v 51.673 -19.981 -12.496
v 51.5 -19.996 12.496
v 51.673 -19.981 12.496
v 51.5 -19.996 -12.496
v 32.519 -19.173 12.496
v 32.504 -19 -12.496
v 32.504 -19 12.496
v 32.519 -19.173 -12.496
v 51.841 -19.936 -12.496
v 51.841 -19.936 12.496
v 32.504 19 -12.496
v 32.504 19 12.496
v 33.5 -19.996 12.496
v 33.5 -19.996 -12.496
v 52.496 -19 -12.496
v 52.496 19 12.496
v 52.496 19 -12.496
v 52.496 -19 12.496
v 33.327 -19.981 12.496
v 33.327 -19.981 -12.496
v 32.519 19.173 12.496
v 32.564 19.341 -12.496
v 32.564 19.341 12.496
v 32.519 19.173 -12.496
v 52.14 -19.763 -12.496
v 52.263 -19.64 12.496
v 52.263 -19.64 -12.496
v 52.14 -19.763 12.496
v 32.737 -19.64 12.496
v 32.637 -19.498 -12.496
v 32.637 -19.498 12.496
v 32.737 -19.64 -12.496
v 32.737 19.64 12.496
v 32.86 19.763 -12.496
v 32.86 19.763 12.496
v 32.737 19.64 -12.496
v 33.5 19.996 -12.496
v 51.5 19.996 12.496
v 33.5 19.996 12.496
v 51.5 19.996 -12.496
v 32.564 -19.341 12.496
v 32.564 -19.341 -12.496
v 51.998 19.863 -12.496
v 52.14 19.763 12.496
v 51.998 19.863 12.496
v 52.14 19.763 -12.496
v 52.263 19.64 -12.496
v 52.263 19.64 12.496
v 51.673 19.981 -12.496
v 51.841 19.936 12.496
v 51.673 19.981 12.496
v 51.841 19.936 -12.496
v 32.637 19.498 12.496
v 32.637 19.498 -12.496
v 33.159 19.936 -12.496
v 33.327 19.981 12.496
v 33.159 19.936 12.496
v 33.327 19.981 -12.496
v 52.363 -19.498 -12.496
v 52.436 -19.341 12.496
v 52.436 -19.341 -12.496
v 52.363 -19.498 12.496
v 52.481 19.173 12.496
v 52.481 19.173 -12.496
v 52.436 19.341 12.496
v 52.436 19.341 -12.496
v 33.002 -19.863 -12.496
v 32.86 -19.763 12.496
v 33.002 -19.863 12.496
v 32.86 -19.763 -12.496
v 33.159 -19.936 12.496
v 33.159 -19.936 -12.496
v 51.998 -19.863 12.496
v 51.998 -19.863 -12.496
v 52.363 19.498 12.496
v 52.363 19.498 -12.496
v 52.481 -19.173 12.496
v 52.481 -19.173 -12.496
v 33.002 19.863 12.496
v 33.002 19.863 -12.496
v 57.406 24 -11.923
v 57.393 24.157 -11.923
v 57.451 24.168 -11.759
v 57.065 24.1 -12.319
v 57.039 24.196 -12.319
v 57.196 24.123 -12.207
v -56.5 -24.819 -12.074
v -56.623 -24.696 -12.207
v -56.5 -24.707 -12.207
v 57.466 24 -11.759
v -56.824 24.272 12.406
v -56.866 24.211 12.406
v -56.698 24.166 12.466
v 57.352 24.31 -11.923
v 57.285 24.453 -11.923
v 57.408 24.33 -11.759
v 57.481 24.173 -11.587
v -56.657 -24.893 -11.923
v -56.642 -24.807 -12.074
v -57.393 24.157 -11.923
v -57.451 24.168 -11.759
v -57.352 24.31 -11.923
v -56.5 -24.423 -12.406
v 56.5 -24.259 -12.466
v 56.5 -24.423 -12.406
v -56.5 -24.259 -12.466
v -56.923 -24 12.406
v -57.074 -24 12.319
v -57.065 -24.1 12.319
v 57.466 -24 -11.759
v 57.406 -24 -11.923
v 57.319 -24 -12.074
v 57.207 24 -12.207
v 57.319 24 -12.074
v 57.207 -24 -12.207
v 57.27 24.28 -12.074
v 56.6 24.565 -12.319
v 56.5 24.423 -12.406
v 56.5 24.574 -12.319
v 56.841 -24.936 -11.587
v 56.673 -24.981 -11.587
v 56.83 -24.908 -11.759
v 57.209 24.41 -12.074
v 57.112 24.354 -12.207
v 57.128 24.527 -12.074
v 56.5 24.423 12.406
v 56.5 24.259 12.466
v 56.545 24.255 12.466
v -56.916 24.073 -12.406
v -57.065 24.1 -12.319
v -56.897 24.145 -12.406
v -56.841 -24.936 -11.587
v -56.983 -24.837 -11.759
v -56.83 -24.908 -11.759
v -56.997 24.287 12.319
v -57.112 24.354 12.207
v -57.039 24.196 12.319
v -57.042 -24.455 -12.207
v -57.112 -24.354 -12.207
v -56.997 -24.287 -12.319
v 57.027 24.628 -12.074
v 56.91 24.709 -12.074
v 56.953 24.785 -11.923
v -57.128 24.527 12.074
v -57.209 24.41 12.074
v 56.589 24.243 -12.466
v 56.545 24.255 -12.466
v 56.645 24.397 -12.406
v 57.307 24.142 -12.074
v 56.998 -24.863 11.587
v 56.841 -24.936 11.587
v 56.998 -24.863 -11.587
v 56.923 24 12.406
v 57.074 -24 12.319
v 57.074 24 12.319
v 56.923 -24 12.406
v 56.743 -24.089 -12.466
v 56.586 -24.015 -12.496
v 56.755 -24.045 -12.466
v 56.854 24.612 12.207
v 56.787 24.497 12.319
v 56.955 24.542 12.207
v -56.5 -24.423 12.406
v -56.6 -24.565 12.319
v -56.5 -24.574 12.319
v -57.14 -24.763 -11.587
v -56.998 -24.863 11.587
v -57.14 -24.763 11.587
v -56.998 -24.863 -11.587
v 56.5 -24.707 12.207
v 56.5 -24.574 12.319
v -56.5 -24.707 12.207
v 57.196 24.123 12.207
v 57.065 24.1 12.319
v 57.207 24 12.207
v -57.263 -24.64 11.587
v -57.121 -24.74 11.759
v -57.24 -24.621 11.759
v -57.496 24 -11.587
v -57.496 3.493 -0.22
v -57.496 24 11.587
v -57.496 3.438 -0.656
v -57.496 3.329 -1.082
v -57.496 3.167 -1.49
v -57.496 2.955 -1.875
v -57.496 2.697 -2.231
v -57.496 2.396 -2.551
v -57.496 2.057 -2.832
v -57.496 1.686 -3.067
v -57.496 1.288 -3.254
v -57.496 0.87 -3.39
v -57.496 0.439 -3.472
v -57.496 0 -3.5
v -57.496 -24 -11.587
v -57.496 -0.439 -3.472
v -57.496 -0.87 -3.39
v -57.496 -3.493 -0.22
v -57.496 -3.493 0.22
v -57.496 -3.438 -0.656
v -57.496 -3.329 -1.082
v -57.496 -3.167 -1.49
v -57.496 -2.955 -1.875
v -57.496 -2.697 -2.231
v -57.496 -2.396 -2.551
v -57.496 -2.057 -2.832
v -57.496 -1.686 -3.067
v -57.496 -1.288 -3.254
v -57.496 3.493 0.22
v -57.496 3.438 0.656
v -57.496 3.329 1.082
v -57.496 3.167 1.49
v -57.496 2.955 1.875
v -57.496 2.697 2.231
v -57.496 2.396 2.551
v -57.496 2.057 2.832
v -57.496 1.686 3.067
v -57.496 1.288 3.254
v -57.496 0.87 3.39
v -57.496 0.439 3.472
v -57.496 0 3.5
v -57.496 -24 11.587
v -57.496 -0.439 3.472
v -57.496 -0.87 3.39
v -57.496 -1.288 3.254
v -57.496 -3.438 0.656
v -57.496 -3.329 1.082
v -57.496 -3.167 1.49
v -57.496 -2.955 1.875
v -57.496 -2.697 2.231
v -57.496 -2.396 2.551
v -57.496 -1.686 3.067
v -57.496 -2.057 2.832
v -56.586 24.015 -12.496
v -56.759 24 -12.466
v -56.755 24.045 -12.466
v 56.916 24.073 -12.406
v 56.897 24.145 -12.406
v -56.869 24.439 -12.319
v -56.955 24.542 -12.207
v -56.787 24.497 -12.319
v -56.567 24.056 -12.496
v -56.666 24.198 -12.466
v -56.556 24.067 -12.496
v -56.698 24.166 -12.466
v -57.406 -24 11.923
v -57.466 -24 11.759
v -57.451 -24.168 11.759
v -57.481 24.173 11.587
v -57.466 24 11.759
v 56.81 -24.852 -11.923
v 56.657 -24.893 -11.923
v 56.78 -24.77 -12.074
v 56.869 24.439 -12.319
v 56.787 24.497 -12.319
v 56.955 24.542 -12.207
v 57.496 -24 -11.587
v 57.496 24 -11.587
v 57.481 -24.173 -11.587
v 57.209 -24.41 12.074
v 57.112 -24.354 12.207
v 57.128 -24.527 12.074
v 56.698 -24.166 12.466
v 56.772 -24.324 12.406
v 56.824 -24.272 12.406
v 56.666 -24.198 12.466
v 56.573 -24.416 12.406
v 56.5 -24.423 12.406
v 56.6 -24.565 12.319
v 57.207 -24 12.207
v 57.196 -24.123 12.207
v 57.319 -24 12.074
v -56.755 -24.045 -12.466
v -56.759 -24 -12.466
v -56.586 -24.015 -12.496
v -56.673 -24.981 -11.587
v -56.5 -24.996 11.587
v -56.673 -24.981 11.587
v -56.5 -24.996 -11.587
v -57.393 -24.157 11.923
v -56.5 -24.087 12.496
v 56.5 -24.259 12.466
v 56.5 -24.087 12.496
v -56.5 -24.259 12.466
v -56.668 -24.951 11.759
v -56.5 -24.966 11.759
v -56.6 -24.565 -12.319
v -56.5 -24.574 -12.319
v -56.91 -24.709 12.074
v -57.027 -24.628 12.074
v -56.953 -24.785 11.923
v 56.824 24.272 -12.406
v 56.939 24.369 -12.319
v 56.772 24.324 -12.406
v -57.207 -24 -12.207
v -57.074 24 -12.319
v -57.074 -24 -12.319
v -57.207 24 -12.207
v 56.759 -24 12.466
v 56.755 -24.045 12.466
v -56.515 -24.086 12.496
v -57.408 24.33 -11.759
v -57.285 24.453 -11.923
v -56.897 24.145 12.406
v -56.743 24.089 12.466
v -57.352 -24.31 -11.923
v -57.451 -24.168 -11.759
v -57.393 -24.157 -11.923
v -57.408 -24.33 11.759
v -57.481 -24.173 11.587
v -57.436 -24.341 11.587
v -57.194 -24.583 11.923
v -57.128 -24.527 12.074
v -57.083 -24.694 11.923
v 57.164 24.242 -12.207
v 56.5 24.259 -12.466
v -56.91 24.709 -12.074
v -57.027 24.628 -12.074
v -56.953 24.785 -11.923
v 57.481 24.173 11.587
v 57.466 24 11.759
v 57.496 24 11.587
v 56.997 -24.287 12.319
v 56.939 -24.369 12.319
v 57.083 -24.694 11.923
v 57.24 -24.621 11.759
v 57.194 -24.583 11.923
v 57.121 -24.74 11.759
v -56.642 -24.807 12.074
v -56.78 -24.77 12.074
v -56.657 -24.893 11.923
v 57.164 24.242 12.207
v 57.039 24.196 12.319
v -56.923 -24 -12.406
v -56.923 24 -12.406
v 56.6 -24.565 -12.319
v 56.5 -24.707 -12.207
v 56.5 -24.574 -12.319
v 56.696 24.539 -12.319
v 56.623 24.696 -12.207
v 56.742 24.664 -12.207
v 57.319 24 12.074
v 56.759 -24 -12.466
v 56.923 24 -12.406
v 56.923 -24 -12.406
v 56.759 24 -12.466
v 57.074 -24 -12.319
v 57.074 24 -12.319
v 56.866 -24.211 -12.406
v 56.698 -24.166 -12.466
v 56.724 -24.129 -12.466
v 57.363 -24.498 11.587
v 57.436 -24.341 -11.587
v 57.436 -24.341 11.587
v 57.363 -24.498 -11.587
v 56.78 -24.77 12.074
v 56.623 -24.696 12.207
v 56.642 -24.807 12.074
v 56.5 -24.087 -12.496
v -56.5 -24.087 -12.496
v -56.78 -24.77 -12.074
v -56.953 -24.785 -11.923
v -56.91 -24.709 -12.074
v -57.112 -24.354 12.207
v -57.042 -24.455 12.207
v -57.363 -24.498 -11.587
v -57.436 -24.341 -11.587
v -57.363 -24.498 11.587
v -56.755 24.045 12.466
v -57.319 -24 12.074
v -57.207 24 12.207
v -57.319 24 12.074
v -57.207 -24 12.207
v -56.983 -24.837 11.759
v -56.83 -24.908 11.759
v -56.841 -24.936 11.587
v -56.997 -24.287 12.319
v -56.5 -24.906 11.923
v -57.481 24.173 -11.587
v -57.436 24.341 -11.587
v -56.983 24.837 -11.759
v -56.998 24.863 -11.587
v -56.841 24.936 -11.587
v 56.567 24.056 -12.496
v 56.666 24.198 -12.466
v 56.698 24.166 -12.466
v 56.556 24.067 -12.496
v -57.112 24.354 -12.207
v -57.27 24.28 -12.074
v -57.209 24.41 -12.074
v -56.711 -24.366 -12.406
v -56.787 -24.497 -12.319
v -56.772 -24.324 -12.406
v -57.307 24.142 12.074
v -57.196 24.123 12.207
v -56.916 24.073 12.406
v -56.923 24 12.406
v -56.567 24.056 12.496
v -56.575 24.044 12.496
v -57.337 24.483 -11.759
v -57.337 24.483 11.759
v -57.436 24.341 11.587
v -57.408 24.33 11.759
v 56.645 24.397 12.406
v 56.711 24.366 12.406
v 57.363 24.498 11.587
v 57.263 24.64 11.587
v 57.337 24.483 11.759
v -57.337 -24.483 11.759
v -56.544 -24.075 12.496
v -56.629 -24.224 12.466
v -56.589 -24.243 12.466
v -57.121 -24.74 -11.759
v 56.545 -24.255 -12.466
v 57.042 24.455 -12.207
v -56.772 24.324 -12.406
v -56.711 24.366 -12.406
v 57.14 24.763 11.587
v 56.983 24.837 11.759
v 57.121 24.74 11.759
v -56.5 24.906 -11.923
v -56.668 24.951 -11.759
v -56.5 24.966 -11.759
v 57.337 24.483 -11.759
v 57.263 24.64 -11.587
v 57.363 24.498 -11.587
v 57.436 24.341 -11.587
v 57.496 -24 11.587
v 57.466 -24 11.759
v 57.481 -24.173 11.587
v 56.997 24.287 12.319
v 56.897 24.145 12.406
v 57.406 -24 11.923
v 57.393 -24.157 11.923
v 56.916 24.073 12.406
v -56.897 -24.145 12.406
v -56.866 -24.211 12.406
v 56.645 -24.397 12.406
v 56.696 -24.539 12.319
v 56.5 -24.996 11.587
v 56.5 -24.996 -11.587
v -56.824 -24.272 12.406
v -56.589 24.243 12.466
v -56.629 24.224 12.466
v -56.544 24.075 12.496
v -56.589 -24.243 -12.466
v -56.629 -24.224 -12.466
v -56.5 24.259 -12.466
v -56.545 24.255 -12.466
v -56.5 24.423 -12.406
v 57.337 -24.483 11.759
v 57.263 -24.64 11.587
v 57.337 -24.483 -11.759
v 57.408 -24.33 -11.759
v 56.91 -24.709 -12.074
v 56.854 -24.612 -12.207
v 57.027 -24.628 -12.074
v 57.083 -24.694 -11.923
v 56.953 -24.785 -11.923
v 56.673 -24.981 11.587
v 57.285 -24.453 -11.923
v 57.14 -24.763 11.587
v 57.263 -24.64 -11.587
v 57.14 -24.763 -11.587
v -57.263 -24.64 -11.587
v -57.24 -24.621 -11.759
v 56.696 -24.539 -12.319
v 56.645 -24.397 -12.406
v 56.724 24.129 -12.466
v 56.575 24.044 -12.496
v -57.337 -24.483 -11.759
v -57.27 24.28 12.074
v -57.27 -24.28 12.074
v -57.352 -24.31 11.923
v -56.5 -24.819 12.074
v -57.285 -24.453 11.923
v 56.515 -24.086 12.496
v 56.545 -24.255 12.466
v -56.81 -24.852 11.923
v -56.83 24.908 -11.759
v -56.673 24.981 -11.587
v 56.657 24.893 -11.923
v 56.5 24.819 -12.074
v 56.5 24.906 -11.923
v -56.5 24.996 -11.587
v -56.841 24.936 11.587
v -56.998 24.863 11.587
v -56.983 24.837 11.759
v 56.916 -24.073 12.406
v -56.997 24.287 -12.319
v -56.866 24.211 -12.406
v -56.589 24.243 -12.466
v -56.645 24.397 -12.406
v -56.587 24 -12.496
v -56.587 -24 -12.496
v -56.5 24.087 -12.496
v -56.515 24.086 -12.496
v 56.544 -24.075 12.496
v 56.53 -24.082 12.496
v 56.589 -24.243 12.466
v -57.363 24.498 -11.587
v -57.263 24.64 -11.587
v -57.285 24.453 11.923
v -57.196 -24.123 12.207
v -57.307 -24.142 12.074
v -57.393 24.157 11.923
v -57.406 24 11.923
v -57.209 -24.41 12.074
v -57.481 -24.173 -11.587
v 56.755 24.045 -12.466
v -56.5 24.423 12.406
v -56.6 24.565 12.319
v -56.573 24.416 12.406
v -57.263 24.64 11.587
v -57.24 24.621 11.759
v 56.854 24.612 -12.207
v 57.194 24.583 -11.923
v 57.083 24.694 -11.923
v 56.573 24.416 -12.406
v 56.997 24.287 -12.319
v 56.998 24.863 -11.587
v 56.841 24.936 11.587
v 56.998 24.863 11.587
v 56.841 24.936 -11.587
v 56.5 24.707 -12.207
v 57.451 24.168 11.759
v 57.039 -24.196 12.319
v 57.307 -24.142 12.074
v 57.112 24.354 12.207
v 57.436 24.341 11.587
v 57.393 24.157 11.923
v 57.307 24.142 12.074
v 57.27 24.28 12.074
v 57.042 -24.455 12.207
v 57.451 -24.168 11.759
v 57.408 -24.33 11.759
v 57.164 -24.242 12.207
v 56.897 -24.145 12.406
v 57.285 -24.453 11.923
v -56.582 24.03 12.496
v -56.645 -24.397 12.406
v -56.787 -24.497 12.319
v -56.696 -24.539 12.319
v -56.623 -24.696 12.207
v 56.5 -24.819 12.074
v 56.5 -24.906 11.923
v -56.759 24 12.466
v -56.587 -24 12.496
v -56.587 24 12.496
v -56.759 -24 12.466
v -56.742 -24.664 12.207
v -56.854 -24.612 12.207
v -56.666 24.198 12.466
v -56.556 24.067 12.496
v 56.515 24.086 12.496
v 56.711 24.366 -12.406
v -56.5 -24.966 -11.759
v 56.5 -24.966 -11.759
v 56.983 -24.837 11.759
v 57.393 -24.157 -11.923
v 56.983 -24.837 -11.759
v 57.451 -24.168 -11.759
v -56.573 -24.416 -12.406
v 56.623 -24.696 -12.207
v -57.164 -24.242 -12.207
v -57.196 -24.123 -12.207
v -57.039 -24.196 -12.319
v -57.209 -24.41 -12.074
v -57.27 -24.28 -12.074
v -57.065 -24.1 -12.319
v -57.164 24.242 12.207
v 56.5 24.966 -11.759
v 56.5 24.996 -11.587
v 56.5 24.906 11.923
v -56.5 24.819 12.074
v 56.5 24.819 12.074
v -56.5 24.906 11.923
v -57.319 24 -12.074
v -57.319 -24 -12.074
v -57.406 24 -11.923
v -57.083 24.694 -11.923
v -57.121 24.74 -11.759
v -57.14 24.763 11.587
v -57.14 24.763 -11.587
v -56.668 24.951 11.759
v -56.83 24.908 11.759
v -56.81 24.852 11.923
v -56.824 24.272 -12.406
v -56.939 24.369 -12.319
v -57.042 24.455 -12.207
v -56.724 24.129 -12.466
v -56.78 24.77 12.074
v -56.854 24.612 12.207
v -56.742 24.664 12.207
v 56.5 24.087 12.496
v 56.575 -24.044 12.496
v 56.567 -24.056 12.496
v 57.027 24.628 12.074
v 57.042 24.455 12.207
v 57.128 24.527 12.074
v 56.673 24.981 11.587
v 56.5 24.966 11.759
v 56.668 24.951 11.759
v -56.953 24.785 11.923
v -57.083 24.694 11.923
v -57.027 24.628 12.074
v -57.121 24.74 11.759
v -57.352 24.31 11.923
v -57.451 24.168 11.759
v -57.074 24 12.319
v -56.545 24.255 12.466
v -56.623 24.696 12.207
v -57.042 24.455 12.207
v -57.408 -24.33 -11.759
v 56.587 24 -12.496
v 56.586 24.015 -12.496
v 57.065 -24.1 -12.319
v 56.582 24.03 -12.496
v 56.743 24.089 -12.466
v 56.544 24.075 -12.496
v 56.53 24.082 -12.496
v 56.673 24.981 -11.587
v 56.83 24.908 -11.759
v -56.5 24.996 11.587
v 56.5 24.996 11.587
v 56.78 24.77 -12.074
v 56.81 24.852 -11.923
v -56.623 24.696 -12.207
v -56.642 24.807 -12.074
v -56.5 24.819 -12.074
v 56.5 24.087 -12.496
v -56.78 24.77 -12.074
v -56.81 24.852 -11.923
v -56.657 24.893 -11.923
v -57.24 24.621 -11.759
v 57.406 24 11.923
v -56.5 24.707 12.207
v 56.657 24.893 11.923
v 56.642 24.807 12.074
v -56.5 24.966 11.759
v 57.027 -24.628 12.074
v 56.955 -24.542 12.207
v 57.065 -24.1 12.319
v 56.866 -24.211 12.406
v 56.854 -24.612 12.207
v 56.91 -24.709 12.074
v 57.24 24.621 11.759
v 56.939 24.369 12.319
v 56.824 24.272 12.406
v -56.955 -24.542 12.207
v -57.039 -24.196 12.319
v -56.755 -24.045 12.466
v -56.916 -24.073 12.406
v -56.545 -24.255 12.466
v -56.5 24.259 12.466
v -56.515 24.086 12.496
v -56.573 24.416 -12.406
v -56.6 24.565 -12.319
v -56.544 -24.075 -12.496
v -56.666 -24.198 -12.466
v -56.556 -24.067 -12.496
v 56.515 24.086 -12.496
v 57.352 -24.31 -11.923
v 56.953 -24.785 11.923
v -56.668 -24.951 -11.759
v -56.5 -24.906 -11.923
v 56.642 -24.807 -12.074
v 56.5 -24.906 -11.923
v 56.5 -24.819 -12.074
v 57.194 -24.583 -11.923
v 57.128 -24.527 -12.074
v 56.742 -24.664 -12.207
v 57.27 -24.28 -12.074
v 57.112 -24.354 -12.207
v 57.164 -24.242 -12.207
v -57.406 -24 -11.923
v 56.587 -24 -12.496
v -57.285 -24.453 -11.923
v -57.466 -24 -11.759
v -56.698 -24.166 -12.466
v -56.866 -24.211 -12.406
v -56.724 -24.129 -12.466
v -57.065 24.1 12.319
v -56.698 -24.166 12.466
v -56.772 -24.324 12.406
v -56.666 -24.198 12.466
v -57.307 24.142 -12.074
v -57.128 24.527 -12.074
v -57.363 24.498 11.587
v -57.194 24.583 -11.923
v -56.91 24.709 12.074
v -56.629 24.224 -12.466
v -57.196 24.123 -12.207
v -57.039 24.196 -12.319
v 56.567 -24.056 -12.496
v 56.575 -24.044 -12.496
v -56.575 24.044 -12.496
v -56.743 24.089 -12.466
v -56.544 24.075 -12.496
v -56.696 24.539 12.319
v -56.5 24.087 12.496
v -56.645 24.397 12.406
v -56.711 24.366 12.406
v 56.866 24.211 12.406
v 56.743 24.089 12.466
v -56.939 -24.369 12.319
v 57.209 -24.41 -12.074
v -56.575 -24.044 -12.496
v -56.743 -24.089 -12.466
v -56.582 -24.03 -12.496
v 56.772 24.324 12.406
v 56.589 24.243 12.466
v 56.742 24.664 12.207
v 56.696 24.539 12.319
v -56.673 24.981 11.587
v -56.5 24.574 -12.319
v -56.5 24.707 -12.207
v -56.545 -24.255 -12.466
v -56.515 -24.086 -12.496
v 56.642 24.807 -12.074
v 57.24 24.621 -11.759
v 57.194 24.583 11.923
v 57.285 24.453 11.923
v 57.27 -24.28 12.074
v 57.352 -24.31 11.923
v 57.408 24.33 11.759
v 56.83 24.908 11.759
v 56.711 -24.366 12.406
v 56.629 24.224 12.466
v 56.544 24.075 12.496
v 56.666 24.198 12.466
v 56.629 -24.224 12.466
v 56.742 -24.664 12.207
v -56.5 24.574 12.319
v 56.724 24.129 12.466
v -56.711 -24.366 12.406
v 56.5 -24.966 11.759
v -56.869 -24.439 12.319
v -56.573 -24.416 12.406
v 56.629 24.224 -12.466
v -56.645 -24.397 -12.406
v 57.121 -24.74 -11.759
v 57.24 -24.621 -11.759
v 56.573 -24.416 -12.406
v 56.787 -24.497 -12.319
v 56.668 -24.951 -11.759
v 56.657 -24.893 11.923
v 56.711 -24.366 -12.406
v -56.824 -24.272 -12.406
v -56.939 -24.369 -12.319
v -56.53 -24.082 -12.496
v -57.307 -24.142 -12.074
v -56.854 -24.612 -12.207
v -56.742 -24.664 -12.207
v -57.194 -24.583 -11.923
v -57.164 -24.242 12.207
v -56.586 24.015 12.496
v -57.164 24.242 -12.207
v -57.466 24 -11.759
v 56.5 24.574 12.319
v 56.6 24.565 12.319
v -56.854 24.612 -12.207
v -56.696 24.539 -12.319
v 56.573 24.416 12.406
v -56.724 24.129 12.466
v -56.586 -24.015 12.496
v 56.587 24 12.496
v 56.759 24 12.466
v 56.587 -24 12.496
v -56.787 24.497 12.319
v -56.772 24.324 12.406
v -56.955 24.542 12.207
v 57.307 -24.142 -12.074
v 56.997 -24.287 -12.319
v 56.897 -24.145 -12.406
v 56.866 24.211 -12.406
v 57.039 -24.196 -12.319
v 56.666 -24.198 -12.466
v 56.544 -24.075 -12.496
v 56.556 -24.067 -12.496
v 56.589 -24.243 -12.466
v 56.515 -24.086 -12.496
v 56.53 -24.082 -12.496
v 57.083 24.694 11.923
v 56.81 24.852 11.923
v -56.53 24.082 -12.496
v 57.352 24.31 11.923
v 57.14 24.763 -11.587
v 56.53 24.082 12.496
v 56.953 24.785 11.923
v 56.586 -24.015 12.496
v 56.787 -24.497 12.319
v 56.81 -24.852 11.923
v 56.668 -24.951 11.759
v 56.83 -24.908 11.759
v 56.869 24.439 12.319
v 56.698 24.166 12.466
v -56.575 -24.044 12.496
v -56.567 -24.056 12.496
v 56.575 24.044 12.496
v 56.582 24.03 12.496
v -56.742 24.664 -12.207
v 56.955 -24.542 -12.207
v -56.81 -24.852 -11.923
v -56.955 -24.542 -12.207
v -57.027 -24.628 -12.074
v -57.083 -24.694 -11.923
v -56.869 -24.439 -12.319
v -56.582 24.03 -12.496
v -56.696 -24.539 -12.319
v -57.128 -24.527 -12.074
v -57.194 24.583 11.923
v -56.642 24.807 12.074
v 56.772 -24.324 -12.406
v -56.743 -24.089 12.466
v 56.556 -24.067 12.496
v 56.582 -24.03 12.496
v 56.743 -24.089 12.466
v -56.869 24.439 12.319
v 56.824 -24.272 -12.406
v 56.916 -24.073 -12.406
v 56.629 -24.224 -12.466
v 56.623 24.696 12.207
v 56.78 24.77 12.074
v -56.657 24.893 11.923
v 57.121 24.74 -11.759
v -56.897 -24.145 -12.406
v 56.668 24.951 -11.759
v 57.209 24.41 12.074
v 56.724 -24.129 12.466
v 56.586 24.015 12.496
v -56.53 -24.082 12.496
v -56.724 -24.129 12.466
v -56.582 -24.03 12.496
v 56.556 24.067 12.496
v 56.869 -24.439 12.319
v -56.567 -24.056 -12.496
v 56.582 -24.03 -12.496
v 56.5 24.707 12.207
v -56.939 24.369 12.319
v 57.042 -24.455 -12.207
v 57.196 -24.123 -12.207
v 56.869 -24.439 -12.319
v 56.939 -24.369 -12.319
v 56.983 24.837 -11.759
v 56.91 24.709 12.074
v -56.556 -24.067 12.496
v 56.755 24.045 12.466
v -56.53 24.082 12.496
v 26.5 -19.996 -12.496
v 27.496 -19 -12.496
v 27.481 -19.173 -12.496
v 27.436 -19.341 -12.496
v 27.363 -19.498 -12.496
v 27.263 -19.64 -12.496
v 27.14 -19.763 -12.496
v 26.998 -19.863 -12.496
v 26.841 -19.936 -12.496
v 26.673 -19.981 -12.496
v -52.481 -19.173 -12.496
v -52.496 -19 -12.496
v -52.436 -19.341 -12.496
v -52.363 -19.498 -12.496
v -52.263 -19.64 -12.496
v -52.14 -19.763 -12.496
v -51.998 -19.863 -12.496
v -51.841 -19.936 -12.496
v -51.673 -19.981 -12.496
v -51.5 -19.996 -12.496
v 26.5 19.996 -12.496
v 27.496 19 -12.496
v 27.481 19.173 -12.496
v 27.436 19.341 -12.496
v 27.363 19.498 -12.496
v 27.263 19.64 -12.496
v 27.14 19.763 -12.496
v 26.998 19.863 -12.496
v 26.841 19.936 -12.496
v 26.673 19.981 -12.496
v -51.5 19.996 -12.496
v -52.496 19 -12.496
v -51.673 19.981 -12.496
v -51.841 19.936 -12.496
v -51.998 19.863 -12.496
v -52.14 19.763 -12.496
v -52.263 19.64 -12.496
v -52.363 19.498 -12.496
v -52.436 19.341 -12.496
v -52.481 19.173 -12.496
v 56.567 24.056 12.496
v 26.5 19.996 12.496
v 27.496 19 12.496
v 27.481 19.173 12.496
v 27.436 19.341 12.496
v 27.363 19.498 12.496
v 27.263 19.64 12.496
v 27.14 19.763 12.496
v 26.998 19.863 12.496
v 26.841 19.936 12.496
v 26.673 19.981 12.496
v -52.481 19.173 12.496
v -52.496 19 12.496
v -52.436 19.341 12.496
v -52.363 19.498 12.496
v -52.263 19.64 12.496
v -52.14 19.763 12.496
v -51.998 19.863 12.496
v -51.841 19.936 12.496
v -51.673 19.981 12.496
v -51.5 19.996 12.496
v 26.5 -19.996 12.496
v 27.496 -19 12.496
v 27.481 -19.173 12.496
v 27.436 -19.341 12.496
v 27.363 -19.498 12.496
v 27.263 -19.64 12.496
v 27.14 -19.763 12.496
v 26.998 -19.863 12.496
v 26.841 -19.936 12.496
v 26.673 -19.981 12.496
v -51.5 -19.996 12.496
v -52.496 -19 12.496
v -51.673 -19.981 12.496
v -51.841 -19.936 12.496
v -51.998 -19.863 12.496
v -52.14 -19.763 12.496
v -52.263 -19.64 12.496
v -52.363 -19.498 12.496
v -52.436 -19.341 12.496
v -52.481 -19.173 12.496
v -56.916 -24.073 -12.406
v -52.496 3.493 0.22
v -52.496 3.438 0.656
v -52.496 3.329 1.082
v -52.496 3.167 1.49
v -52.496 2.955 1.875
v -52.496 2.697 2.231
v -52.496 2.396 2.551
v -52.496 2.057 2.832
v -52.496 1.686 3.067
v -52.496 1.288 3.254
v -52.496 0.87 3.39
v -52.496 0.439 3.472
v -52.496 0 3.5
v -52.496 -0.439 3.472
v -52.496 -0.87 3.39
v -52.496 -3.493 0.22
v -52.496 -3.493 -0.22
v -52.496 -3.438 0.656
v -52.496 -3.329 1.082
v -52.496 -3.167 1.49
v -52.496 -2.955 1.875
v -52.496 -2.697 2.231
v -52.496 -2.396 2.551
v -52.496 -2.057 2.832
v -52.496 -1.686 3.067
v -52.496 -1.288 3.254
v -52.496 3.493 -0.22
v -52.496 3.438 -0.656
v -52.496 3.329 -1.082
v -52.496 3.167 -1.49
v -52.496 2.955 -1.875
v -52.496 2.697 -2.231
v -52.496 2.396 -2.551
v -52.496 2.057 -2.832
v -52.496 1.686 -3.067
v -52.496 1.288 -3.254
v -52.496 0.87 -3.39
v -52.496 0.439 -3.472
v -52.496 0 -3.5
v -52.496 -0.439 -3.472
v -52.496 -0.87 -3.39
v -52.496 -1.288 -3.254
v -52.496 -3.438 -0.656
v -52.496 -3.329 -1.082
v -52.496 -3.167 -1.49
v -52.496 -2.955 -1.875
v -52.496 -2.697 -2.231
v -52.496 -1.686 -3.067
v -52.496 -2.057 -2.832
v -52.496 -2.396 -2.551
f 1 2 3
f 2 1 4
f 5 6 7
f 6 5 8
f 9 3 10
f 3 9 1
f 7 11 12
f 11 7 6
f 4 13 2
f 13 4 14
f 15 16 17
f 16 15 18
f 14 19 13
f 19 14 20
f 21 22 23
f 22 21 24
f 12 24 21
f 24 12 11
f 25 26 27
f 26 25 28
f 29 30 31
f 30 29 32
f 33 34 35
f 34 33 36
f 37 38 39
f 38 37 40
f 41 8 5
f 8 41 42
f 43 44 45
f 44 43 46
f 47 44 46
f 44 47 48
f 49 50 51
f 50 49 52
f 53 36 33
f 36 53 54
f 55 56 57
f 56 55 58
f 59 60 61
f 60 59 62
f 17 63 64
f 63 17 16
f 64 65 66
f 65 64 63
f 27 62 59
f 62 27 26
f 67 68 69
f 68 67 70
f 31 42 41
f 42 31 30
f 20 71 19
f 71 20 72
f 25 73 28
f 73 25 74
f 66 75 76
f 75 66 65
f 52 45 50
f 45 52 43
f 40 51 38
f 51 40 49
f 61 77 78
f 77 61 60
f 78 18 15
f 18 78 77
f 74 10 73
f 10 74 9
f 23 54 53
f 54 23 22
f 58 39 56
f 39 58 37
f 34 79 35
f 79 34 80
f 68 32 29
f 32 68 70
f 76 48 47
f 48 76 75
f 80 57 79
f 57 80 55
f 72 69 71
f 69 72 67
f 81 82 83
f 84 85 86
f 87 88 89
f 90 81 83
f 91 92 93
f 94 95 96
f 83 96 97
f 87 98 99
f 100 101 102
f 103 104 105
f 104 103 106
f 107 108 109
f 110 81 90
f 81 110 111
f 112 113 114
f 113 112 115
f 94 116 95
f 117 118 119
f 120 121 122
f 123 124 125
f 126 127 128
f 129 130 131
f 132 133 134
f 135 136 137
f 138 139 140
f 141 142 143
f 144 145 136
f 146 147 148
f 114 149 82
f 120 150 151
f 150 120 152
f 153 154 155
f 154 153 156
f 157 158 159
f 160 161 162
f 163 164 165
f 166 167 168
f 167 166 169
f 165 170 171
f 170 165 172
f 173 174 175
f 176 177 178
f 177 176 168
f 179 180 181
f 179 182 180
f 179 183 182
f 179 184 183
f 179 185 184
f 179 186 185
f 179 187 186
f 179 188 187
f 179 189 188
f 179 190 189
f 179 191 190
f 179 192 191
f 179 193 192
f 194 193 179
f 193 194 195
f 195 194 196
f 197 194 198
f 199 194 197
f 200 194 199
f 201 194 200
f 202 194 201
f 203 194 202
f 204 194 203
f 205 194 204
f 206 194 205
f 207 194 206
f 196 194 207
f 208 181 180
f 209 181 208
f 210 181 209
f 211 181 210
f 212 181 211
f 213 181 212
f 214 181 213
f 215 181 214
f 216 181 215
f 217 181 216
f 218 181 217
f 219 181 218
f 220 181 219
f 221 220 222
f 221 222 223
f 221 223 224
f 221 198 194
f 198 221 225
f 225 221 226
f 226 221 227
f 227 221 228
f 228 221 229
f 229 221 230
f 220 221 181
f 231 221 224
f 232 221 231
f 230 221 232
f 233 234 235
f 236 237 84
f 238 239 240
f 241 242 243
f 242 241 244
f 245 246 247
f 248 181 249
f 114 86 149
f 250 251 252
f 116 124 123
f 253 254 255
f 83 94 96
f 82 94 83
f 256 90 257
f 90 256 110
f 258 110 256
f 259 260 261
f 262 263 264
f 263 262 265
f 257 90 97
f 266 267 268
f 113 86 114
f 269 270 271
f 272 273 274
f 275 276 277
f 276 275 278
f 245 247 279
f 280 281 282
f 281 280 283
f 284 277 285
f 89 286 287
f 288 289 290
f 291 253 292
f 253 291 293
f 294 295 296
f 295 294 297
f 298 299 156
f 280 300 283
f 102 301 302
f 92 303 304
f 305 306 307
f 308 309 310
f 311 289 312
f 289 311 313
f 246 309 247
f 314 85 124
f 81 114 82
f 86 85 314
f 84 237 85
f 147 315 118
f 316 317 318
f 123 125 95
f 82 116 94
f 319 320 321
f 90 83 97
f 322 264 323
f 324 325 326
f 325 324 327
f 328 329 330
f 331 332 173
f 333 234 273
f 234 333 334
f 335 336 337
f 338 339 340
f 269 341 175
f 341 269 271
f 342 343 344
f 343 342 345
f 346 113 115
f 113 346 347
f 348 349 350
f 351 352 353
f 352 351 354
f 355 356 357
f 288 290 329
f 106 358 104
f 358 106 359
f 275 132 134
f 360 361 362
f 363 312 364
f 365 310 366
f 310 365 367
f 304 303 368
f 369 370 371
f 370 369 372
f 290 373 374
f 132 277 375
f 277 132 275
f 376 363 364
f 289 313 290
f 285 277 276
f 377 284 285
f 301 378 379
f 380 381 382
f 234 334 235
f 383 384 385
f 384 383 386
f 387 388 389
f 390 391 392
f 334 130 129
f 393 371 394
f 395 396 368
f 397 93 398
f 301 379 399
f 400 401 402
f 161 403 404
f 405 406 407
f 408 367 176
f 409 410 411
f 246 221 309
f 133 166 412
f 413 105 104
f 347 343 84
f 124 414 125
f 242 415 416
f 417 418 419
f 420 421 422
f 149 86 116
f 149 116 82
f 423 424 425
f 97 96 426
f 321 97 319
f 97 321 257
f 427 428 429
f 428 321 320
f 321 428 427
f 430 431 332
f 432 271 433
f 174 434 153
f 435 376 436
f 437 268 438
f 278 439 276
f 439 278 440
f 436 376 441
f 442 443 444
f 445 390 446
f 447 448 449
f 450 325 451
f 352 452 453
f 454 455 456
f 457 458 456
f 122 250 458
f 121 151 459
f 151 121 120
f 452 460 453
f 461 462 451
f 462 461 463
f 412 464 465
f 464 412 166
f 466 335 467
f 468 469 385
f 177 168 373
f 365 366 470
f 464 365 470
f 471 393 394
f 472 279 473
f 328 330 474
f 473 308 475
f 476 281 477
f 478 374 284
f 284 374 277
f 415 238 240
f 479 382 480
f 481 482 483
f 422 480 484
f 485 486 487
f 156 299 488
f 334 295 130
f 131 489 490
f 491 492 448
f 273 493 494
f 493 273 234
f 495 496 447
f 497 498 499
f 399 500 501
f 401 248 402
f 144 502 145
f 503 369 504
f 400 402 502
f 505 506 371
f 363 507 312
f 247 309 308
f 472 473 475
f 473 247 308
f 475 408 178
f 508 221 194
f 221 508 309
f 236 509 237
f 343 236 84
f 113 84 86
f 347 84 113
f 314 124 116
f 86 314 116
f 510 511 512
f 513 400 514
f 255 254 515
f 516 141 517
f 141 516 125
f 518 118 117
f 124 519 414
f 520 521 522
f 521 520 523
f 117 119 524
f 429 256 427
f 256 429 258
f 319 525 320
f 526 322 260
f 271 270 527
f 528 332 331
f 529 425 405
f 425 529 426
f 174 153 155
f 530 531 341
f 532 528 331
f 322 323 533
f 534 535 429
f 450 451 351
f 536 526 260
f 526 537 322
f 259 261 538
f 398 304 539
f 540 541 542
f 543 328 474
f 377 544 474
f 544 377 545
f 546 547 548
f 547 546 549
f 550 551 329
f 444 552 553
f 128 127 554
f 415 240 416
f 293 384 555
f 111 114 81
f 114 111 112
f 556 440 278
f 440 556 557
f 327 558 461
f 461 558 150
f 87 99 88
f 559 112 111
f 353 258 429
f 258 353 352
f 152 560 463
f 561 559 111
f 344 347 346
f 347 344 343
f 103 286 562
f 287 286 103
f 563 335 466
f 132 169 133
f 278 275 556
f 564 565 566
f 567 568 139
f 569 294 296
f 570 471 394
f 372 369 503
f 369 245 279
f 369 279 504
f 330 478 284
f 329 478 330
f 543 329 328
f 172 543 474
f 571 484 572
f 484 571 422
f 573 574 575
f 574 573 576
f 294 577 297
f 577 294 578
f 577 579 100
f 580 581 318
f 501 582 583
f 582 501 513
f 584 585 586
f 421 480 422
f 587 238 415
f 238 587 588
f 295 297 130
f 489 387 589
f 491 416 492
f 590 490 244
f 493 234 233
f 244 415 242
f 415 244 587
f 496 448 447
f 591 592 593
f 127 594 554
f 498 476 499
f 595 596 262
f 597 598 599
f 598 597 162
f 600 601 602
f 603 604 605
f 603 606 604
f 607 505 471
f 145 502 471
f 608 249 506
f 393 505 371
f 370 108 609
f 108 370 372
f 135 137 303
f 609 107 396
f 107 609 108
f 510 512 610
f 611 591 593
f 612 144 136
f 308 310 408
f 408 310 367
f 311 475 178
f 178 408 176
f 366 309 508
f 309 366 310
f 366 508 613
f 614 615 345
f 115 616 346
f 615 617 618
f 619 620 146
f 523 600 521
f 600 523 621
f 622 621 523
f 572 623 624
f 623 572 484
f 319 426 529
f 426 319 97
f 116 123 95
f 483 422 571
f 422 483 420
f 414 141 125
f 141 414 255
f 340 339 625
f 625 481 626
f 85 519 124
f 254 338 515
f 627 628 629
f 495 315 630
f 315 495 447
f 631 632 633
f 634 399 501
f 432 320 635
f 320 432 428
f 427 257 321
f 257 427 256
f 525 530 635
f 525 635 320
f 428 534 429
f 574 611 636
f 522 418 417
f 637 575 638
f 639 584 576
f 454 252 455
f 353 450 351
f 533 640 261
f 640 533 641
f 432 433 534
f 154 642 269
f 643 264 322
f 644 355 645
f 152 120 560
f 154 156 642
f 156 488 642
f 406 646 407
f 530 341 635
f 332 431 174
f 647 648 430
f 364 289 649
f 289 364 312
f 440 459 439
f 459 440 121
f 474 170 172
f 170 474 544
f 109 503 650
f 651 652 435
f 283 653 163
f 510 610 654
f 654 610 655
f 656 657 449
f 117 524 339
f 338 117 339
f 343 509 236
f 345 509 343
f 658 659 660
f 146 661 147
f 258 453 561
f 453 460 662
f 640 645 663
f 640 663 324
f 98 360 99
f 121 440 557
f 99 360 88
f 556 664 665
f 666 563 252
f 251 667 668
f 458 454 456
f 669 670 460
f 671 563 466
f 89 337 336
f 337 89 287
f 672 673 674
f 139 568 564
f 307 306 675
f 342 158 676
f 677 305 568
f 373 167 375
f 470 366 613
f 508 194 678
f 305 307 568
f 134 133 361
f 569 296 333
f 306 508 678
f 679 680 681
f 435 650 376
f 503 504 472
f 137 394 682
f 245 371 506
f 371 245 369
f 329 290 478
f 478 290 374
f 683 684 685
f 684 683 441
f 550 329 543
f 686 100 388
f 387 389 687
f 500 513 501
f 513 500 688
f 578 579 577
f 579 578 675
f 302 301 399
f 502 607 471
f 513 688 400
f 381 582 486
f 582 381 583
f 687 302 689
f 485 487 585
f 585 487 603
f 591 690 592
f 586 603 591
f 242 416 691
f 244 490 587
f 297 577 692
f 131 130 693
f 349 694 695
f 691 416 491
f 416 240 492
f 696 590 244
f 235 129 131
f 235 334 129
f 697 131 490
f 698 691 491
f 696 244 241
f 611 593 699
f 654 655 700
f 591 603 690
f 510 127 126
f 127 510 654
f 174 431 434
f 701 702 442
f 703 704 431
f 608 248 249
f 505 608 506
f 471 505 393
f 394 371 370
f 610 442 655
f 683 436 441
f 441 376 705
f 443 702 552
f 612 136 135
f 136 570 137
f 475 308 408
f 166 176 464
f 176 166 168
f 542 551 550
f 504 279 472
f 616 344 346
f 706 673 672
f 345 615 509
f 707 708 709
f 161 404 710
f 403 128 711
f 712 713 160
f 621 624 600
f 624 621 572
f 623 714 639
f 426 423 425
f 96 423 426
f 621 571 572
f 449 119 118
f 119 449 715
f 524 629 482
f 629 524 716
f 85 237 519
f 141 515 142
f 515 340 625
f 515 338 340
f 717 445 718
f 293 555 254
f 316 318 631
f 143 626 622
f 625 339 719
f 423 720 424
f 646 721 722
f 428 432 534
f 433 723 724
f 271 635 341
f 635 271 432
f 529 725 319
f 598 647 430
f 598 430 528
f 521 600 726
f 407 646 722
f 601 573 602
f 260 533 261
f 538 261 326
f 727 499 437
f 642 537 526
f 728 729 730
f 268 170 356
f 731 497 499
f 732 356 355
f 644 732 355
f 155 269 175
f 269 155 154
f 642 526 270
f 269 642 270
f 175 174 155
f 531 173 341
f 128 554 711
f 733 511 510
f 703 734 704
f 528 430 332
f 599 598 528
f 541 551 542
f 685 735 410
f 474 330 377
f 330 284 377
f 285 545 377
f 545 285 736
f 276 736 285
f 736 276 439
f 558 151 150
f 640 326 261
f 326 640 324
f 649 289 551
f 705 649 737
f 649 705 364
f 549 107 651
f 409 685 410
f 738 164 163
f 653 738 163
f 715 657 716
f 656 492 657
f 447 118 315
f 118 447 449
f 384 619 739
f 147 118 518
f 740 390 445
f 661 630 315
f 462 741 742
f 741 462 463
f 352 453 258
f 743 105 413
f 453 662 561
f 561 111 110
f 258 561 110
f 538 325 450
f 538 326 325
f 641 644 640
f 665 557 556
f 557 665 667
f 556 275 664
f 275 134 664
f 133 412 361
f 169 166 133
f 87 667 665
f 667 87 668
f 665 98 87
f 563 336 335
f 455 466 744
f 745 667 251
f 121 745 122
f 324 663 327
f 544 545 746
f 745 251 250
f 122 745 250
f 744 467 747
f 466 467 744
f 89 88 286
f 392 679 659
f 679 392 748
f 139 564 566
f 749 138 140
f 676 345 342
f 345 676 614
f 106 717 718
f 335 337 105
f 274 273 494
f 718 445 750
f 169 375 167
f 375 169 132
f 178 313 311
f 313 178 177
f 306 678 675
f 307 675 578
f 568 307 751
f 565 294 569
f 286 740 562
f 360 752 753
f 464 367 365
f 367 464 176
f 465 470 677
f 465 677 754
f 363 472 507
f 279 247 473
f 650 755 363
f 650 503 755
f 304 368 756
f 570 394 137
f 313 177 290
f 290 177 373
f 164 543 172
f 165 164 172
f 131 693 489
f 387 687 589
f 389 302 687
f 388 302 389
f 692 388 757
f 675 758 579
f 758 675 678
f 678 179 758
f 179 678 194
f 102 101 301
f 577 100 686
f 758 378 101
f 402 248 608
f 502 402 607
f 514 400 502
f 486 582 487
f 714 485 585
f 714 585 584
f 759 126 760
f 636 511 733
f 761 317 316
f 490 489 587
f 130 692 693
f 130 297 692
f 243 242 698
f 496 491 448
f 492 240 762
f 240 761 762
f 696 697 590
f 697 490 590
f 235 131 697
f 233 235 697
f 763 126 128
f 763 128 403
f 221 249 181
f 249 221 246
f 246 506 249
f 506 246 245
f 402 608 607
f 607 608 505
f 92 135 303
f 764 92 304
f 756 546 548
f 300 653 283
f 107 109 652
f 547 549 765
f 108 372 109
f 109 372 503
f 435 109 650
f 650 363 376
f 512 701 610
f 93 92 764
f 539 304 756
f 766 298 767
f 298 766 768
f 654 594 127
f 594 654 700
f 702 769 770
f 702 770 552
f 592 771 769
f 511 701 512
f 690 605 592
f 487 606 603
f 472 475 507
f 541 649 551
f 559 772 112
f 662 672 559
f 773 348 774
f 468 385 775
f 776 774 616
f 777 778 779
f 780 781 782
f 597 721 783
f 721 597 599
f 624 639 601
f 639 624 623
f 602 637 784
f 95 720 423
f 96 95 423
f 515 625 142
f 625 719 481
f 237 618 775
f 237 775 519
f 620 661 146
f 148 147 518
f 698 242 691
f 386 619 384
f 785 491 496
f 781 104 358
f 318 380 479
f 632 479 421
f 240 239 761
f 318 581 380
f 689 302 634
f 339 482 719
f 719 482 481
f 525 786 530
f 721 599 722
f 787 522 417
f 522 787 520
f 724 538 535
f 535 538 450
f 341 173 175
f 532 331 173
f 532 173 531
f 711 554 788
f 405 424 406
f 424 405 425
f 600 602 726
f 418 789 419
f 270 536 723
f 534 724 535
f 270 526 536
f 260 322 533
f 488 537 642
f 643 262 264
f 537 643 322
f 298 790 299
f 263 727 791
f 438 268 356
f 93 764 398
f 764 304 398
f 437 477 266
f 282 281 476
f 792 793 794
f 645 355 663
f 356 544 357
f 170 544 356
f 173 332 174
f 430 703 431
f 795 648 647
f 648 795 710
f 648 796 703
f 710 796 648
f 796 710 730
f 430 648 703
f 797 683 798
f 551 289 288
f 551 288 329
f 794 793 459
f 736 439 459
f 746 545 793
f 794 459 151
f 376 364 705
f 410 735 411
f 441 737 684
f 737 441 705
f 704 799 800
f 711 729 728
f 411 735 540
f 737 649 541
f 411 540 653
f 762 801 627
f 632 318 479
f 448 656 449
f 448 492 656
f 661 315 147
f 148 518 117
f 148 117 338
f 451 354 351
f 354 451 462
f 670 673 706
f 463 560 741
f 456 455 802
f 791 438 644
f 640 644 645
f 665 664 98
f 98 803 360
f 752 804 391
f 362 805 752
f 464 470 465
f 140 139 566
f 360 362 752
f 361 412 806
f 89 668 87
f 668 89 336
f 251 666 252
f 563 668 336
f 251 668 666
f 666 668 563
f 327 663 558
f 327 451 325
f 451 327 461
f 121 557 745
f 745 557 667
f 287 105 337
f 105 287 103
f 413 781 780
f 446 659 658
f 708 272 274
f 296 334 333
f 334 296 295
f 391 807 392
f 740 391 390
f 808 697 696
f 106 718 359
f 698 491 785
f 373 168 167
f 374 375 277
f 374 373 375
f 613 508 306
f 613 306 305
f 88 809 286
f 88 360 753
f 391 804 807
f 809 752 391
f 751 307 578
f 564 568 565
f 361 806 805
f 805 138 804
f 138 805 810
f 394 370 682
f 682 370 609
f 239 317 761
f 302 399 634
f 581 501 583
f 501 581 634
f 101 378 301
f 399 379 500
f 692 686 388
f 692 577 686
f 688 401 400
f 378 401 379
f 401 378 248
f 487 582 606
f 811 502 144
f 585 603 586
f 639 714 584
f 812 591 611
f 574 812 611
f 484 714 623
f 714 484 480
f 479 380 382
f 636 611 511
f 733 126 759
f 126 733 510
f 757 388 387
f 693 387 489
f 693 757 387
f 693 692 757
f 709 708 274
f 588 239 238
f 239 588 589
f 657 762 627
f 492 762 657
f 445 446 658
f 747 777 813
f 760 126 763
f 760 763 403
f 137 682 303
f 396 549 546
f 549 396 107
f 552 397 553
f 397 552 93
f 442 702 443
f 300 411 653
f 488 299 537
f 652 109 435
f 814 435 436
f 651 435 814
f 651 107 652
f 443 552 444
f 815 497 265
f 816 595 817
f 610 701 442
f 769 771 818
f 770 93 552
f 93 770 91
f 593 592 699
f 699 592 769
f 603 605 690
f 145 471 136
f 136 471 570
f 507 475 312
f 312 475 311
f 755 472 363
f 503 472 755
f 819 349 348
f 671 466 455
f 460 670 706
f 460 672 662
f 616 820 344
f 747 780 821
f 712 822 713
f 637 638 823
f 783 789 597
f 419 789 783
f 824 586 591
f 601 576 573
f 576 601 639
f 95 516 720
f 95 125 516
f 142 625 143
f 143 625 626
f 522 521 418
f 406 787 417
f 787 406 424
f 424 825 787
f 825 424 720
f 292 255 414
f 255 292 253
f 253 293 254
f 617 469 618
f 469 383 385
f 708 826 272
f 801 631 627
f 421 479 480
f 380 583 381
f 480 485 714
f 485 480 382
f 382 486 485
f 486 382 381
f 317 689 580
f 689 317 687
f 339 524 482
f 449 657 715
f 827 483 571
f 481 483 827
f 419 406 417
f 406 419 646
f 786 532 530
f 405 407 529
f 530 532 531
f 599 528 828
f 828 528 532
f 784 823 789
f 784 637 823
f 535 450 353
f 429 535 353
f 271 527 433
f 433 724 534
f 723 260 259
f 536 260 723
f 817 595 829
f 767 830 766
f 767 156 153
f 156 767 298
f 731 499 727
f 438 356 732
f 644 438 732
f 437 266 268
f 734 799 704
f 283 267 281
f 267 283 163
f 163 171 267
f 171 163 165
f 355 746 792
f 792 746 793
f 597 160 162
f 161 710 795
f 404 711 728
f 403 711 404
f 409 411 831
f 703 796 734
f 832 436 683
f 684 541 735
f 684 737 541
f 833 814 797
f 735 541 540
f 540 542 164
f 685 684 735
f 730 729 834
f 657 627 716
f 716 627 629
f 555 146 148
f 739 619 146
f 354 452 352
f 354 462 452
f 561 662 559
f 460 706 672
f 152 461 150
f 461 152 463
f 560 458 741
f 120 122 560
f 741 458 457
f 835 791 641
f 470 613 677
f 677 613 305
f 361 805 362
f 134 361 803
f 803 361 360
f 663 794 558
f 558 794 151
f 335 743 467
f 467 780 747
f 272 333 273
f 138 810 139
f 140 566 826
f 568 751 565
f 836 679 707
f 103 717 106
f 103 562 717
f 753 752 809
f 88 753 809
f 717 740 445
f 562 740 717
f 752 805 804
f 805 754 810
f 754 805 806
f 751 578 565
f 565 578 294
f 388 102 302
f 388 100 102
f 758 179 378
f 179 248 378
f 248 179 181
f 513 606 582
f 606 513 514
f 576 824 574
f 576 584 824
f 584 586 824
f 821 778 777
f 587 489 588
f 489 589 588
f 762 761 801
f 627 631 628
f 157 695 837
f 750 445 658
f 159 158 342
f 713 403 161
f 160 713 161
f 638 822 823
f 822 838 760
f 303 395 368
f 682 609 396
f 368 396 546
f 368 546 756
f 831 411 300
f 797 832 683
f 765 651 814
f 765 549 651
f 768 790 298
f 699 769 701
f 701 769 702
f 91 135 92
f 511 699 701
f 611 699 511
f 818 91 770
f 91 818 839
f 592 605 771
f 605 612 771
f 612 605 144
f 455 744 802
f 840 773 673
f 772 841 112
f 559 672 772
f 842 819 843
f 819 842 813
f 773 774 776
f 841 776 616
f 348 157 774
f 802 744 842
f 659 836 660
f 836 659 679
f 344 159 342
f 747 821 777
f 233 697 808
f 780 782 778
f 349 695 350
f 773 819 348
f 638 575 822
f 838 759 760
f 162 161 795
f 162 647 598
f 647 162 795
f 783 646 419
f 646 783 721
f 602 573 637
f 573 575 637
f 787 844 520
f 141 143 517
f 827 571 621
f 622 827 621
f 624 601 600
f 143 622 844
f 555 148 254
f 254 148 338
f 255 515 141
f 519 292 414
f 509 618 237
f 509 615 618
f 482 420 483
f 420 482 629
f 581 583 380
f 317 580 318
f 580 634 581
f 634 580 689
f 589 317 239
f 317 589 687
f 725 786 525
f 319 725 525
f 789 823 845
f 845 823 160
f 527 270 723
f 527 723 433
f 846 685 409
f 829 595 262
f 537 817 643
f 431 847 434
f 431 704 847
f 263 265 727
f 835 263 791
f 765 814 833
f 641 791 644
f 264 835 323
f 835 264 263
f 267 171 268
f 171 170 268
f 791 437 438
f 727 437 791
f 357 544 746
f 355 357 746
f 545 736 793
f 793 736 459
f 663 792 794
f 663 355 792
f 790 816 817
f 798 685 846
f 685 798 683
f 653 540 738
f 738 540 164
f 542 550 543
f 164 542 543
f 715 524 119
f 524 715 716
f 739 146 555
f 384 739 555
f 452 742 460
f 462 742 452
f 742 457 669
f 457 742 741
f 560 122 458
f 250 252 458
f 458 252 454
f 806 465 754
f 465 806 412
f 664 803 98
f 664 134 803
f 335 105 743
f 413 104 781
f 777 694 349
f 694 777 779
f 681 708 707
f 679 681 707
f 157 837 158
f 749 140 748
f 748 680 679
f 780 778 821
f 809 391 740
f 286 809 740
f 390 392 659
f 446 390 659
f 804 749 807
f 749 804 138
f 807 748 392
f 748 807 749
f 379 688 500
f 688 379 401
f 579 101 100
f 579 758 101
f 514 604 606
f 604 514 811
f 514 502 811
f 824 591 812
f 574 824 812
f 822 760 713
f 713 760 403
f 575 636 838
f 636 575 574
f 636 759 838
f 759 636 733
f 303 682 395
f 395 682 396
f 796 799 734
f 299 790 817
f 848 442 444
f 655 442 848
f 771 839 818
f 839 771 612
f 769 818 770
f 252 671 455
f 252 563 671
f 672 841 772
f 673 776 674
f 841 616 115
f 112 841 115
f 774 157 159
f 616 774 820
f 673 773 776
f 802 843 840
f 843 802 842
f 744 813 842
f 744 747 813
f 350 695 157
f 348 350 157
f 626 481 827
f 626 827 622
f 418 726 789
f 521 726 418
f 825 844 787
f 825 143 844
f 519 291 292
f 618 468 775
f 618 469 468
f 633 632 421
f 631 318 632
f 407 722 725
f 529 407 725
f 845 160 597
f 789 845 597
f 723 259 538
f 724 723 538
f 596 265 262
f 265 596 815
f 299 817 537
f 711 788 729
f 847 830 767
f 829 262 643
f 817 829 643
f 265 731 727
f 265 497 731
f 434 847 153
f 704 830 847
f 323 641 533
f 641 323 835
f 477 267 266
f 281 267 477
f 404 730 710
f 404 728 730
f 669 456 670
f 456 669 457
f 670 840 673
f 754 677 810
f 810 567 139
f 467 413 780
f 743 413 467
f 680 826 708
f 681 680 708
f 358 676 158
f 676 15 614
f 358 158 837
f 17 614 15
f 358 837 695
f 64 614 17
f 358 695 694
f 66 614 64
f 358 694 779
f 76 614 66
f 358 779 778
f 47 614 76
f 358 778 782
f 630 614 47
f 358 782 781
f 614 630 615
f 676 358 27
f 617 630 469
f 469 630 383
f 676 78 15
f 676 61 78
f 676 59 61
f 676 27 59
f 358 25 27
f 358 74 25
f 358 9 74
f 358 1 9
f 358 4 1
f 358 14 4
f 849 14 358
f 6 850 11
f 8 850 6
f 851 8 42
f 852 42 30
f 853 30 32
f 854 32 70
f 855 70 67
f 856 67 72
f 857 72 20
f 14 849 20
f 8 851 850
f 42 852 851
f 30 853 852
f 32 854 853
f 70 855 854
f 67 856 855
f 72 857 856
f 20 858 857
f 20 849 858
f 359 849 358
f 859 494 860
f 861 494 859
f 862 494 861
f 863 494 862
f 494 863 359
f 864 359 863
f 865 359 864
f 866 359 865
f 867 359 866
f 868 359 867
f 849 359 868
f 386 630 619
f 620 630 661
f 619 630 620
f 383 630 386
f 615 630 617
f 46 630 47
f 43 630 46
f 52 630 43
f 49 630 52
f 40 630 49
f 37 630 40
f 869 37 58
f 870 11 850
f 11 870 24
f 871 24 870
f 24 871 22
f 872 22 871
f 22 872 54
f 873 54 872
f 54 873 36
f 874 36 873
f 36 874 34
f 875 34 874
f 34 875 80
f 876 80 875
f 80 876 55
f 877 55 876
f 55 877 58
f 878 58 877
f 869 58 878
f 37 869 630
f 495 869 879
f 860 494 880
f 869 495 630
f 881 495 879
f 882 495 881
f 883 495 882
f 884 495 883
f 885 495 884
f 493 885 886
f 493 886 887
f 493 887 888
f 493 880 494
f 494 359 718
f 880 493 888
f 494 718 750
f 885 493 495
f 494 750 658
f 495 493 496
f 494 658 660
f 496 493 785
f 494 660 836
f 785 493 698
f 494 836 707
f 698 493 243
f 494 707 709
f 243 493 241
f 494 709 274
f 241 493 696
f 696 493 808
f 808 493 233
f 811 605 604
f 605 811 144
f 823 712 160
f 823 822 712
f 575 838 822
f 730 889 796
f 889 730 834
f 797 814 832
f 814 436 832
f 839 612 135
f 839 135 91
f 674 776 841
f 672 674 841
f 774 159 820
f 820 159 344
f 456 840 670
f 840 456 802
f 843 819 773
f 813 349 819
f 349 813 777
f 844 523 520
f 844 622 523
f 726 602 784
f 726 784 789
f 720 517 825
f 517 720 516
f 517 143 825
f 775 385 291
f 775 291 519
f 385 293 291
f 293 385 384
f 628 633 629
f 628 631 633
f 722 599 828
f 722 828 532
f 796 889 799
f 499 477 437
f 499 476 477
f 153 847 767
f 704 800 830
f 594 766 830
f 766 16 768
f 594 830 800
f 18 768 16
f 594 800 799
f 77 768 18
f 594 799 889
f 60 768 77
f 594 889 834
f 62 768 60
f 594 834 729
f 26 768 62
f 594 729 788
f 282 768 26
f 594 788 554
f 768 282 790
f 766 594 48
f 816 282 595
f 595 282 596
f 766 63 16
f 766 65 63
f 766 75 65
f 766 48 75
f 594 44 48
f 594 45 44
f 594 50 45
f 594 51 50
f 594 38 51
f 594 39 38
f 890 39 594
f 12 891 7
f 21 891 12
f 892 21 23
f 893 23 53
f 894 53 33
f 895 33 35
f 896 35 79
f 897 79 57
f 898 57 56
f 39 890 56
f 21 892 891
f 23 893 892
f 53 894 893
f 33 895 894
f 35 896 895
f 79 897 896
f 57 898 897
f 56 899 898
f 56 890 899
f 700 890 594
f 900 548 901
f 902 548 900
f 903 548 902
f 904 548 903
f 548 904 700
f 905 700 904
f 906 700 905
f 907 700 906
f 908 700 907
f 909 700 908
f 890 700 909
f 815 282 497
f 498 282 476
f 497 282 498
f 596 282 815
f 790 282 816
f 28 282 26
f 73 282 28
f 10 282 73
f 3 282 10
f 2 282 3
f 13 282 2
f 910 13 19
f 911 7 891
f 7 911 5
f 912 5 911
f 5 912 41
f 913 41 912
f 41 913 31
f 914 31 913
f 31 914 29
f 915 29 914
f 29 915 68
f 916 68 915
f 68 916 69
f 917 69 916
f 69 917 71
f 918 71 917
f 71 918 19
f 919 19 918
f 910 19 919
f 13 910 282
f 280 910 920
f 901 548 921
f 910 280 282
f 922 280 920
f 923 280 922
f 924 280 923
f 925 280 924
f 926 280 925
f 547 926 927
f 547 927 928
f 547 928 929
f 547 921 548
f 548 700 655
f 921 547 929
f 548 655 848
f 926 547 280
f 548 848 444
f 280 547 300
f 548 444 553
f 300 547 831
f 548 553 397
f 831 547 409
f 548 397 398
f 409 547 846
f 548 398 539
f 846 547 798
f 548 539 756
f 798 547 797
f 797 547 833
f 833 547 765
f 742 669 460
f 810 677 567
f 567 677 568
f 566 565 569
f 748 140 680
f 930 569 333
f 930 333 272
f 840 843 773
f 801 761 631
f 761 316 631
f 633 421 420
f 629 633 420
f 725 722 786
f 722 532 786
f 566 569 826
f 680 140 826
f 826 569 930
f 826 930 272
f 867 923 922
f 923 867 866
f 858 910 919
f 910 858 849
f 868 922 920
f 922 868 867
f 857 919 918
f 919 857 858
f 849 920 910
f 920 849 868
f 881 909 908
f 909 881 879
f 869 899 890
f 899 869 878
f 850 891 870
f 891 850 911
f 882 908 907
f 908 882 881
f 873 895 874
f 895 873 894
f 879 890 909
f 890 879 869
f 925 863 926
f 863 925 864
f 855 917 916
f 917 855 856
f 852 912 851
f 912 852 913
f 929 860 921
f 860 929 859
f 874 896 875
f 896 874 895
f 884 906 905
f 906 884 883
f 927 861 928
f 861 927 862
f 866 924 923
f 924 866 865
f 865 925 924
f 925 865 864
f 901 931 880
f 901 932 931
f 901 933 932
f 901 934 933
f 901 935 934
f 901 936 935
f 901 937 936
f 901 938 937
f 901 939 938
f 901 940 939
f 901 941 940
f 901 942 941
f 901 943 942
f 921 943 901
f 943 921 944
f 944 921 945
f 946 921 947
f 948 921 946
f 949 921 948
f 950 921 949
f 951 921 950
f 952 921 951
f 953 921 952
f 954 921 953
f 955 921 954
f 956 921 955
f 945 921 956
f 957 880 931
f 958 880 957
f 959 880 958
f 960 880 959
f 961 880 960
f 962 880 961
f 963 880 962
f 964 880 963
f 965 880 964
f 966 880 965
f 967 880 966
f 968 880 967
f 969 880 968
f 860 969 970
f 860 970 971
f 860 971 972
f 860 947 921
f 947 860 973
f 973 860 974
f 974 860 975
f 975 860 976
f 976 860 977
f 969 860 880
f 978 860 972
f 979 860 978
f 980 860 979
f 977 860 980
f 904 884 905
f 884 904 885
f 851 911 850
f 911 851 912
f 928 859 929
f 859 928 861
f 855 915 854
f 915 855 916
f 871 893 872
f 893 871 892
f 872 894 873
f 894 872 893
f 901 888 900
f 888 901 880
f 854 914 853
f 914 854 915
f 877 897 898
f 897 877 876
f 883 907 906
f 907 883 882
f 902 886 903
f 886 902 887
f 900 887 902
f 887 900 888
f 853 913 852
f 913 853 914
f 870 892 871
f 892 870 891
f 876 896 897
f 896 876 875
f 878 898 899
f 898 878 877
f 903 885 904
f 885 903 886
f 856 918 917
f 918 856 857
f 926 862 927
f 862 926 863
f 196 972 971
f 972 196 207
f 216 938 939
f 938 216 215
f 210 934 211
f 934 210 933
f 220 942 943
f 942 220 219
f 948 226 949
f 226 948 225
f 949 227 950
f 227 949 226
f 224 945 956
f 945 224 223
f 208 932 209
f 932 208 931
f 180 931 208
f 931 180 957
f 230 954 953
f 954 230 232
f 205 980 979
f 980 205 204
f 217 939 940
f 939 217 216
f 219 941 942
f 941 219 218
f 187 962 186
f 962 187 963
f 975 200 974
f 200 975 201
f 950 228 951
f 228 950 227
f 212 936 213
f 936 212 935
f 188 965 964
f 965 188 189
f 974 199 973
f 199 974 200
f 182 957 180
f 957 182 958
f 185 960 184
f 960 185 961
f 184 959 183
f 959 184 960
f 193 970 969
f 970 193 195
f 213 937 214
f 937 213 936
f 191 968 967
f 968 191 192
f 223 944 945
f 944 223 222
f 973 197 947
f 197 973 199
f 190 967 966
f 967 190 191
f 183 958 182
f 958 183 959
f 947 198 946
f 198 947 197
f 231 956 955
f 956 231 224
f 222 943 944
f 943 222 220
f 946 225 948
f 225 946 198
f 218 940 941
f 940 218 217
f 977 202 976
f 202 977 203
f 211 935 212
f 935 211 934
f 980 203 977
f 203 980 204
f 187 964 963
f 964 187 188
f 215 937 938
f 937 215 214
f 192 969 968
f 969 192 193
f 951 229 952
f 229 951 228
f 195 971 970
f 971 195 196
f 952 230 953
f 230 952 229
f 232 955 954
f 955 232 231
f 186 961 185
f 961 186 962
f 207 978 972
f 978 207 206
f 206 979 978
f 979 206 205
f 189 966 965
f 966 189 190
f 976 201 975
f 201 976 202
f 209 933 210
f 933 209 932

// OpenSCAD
difference(){
    
    minkowski(){cube([113,48,23],true);sphere(r=1,$fn=36); };
    translate([115/2-15,0,0]){
        minkowski(){
                cube([18,38,50],true);
                sphere(r=1,$fn=36);
            }
            rotate([0,0,90]){cylinder(d=6.5, h=50);}
        }
        translate([-115/2+45,0,0]){
            minkowski(){
                cube([78,38,50],true);
                sphere(r=1,$fn=36);
                }
            }
    rotate([0,-90,0]){cylinder(d=7,h=100, $fn=50);}
}
